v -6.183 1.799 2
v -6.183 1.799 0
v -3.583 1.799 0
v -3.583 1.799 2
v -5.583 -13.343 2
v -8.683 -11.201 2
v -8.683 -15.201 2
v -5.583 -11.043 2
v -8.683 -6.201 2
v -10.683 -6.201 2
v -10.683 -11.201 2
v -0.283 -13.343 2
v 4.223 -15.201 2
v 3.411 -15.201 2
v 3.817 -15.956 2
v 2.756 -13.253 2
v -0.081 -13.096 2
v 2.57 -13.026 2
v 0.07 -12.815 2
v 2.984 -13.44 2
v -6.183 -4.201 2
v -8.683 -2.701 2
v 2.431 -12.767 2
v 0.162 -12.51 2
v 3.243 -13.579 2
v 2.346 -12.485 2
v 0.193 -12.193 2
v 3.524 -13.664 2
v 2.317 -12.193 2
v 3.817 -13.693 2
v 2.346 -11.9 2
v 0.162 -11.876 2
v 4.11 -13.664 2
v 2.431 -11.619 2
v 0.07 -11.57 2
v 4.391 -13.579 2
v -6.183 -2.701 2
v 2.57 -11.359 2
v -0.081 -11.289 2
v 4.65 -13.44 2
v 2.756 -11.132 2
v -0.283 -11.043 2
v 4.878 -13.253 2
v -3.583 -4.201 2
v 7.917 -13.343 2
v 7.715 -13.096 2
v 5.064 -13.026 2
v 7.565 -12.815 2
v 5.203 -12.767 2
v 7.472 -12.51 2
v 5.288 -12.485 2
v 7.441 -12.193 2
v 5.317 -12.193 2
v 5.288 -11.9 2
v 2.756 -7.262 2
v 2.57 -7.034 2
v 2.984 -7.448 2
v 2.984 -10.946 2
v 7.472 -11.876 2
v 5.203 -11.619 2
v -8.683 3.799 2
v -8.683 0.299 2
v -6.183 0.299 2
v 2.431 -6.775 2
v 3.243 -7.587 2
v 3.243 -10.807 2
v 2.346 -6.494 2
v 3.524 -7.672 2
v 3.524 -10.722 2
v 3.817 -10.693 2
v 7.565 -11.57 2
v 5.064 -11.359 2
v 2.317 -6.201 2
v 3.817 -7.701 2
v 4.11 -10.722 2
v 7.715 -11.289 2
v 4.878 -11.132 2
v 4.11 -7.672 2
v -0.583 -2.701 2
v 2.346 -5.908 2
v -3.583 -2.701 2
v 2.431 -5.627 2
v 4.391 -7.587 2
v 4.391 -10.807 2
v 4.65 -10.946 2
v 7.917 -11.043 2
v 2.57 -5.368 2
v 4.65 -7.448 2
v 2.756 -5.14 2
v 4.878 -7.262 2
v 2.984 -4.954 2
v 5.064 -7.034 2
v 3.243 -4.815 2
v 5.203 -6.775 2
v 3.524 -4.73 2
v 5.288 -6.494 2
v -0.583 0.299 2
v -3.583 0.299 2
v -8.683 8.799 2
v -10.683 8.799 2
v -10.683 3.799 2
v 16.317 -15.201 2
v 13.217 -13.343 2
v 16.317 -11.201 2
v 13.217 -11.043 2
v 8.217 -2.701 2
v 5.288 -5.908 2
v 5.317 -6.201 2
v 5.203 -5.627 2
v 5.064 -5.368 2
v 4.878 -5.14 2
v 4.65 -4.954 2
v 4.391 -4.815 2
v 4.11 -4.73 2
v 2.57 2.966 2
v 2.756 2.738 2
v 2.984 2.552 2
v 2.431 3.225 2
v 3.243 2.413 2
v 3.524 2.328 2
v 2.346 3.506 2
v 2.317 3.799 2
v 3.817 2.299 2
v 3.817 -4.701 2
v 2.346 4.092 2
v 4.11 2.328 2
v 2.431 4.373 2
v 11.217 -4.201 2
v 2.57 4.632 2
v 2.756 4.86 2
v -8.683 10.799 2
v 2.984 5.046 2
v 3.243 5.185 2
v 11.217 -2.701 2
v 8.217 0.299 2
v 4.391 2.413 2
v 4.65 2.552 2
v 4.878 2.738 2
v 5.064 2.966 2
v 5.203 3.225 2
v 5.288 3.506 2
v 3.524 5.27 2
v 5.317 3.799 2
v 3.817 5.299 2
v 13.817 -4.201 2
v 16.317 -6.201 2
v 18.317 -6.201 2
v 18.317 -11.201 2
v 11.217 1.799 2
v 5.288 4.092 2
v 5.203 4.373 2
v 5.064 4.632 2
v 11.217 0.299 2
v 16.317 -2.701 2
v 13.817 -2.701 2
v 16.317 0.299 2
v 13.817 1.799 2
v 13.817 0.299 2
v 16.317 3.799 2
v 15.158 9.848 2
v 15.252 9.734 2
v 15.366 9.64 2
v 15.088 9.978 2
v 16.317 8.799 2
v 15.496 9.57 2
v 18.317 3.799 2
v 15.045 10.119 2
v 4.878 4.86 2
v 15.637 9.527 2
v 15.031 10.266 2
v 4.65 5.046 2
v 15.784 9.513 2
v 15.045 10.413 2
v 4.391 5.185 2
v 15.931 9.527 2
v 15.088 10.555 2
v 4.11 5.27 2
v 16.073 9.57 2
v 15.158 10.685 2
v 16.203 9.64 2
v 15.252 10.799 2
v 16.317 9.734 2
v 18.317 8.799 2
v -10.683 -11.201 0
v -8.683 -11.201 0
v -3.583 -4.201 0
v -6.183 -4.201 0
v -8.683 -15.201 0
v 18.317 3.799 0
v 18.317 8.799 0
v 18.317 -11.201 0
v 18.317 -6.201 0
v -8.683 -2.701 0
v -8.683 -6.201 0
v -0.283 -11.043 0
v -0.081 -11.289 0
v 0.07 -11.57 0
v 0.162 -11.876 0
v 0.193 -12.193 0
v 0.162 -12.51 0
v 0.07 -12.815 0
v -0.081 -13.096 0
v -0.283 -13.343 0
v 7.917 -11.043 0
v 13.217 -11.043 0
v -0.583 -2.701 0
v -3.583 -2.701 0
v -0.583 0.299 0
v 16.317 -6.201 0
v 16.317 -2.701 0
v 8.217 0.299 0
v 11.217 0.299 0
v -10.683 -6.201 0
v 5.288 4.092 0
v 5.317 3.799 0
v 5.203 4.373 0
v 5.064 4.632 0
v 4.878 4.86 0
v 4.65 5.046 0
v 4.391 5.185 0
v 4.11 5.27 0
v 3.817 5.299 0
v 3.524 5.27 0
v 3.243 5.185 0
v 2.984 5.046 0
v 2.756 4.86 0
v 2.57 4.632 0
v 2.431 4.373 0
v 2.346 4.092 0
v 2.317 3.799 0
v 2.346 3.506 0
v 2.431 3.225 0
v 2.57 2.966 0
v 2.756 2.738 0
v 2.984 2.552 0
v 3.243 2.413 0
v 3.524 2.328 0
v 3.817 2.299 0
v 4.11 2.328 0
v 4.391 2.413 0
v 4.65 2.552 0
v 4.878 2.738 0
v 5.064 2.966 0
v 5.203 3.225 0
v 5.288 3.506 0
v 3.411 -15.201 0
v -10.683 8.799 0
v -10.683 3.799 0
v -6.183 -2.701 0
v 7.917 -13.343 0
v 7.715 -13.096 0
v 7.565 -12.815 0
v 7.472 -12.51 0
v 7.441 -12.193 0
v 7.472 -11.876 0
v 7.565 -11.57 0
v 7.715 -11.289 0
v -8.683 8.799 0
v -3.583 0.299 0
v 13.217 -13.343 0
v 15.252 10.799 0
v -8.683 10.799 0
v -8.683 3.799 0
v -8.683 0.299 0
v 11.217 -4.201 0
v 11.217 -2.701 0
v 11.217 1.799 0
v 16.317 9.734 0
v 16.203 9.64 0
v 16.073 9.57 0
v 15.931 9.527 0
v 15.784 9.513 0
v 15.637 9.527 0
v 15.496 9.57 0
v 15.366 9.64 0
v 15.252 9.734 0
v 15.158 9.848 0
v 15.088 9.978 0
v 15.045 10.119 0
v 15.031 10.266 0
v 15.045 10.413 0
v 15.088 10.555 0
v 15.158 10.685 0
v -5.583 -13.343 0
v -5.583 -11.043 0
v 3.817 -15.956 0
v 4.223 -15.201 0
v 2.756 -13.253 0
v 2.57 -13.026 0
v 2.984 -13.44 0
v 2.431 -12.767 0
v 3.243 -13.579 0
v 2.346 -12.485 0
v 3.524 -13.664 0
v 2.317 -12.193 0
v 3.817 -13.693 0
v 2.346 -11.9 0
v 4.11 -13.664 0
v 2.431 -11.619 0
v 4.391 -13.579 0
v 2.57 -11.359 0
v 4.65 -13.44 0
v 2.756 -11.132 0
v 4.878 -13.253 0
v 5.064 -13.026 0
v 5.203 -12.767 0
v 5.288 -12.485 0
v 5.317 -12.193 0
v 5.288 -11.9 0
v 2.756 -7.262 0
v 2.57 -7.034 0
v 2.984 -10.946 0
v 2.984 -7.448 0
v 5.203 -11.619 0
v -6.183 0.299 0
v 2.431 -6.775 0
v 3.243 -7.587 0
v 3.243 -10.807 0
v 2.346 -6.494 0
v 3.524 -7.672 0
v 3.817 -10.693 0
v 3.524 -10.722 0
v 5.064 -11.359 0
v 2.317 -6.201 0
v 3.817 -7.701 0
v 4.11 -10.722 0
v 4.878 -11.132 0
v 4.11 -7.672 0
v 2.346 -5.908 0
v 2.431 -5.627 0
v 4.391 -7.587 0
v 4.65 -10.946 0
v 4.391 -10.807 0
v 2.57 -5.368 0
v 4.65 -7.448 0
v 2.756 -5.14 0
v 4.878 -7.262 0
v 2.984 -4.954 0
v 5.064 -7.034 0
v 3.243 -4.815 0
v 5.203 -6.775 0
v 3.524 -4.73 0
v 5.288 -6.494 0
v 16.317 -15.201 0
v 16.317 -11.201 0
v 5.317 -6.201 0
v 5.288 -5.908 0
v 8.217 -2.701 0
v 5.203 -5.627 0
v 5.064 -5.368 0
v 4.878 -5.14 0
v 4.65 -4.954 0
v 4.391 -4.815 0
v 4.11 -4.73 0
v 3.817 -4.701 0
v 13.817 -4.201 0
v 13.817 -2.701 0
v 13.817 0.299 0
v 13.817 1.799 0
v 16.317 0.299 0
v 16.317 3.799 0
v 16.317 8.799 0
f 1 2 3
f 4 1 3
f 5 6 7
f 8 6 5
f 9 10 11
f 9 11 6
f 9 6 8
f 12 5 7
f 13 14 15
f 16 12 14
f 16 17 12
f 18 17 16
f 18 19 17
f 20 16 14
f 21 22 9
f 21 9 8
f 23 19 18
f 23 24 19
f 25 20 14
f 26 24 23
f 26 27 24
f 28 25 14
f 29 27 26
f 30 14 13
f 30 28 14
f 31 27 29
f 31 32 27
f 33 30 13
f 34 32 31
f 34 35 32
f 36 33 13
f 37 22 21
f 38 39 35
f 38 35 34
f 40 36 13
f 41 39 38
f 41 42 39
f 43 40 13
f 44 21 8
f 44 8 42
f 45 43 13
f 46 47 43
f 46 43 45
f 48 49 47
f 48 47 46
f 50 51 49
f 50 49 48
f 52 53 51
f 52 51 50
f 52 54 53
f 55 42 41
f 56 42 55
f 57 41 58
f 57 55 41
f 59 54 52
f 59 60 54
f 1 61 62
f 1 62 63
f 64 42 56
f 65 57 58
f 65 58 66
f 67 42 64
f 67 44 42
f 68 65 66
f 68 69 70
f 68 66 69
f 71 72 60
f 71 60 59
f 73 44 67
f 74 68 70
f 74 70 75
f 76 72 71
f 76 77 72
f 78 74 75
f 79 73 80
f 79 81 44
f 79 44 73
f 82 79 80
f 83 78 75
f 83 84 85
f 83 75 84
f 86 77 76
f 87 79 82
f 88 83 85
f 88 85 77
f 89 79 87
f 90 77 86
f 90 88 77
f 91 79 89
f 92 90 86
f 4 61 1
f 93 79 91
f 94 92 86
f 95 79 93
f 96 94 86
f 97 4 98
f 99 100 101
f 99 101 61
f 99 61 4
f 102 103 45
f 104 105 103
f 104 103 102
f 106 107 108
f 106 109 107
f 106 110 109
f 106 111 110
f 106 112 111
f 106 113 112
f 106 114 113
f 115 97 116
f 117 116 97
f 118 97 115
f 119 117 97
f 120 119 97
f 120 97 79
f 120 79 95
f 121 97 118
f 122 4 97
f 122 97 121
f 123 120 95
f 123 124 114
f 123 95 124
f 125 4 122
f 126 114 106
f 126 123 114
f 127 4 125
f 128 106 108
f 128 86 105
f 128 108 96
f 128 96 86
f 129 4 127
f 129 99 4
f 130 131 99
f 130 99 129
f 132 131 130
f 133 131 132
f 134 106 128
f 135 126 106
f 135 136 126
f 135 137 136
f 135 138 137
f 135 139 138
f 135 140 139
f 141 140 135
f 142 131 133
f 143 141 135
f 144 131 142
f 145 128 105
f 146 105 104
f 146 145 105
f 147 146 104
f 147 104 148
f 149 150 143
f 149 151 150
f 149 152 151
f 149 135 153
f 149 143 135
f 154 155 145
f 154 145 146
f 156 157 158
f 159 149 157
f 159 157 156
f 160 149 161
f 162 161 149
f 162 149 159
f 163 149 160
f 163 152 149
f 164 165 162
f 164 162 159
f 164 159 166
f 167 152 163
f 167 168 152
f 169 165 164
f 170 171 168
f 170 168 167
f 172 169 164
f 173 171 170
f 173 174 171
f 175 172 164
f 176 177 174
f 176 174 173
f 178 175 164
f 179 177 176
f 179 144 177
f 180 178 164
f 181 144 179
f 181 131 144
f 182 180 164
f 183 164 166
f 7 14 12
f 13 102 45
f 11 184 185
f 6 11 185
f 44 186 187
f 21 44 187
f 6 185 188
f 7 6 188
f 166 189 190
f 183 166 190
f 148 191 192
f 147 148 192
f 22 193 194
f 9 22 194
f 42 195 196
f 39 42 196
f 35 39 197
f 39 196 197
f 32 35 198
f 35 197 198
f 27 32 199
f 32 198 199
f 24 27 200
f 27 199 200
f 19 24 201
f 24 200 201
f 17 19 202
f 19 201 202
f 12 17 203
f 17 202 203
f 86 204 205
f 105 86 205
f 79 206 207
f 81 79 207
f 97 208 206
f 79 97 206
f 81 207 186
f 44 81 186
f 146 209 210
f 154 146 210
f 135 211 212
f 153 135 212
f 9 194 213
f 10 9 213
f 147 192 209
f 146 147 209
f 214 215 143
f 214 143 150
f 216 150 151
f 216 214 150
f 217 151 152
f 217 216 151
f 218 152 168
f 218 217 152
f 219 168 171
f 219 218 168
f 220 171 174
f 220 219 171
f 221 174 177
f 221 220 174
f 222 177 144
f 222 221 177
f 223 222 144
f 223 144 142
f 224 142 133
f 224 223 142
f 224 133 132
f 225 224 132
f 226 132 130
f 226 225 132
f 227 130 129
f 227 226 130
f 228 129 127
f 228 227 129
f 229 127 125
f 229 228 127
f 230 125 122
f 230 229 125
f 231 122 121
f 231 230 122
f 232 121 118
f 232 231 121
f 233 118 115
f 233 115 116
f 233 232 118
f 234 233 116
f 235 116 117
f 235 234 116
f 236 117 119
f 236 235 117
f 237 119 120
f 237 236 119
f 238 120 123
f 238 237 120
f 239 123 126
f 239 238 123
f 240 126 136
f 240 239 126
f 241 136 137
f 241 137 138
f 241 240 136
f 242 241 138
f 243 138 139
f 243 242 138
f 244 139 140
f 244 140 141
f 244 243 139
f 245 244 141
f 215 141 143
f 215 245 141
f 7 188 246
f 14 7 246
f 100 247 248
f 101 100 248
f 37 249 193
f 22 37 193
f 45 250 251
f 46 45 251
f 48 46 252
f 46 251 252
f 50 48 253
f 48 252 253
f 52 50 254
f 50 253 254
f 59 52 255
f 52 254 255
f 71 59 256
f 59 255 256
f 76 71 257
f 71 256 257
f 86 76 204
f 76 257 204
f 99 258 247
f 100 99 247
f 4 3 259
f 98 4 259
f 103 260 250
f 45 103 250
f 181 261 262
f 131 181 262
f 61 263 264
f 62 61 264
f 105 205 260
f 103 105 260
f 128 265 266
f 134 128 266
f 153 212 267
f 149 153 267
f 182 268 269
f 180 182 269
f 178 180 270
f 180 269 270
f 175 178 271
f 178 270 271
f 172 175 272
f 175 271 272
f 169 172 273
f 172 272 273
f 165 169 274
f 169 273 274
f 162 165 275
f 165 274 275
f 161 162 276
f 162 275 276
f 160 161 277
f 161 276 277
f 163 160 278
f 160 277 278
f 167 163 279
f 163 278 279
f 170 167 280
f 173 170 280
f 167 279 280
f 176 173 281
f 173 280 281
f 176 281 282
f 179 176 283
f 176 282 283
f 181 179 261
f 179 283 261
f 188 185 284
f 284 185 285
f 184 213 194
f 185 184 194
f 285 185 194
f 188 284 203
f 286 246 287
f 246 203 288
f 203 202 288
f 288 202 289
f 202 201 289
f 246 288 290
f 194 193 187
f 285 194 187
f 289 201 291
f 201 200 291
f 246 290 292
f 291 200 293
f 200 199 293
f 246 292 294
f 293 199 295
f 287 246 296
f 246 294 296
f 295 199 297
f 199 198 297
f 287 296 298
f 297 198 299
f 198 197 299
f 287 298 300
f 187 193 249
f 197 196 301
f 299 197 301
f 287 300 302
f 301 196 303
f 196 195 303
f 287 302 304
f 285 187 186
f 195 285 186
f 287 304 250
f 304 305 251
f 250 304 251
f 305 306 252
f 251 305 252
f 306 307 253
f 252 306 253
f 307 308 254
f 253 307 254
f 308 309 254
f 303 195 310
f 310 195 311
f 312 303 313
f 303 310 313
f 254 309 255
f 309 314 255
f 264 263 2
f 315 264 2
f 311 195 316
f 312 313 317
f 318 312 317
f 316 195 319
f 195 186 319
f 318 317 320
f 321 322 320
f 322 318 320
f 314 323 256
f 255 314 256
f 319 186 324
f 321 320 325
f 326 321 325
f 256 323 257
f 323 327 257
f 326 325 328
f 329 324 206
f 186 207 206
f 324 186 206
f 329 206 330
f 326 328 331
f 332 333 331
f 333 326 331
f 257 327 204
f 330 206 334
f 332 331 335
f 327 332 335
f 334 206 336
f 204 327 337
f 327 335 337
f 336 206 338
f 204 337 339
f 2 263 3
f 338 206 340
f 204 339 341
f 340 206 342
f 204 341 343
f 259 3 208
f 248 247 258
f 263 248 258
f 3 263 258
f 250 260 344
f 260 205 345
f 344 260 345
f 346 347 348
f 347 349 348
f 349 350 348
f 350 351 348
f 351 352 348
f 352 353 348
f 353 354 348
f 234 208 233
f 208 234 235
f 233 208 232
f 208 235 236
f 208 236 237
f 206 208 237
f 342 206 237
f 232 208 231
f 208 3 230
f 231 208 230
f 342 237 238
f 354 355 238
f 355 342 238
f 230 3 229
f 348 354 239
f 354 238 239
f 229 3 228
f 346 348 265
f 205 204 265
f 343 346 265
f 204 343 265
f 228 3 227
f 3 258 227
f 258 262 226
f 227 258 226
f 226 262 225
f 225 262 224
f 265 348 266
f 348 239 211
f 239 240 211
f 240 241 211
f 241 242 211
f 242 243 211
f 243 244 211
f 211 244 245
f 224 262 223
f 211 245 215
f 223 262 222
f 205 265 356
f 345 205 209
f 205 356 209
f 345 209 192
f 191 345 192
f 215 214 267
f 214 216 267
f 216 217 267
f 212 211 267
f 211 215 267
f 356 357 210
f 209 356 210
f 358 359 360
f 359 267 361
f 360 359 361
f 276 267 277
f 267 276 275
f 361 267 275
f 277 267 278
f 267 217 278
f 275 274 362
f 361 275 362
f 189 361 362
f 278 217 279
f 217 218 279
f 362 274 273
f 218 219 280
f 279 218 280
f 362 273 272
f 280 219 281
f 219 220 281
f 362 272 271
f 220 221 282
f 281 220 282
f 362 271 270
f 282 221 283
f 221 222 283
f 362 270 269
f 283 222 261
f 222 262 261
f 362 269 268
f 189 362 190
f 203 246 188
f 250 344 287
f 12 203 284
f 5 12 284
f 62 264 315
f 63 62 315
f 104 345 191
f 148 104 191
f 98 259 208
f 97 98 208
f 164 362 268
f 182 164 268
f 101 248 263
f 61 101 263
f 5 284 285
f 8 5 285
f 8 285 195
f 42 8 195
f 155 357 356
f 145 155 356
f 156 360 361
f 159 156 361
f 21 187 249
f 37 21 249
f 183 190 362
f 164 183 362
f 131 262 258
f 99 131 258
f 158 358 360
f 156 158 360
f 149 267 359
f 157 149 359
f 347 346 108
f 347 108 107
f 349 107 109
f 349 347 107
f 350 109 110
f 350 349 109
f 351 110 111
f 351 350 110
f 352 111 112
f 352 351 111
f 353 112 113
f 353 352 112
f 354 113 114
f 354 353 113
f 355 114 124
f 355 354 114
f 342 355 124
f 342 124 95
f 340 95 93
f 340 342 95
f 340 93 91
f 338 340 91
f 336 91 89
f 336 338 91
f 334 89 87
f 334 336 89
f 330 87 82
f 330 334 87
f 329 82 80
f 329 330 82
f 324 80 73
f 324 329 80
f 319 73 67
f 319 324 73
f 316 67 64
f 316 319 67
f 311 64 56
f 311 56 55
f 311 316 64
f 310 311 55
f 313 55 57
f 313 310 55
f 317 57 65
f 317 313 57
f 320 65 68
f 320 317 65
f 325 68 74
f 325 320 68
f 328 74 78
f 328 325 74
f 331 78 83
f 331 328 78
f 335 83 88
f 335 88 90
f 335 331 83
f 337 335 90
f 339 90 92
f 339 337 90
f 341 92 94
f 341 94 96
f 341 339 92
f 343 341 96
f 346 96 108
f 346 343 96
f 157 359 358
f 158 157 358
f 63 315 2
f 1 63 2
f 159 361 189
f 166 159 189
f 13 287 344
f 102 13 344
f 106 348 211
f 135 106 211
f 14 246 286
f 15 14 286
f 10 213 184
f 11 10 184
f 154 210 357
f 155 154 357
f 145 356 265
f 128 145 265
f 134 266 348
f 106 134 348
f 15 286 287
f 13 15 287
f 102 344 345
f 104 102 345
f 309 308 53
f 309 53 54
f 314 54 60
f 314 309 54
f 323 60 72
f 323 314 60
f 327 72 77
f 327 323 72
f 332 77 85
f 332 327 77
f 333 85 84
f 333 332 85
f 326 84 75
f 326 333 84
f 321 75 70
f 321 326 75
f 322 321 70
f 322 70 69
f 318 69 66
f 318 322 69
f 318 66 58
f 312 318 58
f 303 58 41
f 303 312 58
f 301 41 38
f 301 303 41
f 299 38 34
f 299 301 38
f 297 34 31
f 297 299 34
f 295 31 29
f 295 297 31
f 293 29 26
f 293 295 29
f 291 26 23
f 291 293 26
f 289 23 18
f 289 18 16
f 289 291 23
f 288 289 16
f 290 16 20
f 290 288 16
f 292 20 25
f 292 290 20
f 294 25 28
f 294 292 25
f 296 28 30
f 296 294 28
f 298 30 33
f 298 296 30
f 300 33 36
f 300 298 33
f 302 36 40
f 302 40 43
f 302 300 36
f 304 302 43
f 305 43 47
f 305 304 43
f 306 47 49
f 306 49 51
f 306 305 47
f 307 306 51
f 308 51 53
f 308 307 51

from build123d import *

# Parameters (mm, degrees)
SKETCH_1_R      = 1.5
EXTRUDE_1_DEPTH = 2


with BuildPart() as part:
    # 草图1 → 凸台-拉伸1 (new body)
    with BuildSketch(Plane.XY):
        with BuildLine():
            Line((18.317061038, 8.799028027), (16.317061038, 8.799028027))
            Line((16.317061038, 8.799028027), (16.317061038, 9.733577366))
            ThreePointArc((16.317061038, 9.733577366), (15.251610376, 9.733577366), (15.251610376, 10.799028027))
            Line((15.251610376, 10.799028027), (-8.682938962, 10.799028027))
            Line((-8.682938962, 10.799028027), (-8.682938962, 8.799028027))
            Line((-8.682938962, 8.799028027), (-10.682938962, 8.799028027))
            Line((-10.682938962, 8.799028027), (-10.682938962, 3.799028027))
            Line((-10.682938962, 3.799028027), (-8.682938962, 3.799028027))
            Line((-8.682938962, 3.799028027), (-8.682938962, 0.299028027))
            Line((-8.682938962, 0.299028027), (-6.182938962, 0.299028027))
            Line((-6.182938962, 0.299028027), (-6.182938962, 1.799028027))
            Line((-6.182938962, 1.799028027), (-3.582938962, 1.799028027))
            Line((-3.582938962, 1.799028027), (-3.582938962, 0.299028027))
            Line((-3.582938962, 0.299028027), (-0.582938962, 0.299028027))
            Line((-0.582938962, 0.299028027), (-0.582938962, -2.700971973))
            Line((-0.582938962, -2.700971973), (-3.582938962, -2.700971973))
            Line((-3.582938962, -2.700971973), (-3.582938962, -4.200971973))
            Line((-3.582938962, -4.200971973), (-6.182938962, -4.200971973))
            Line((-6.182938962, -4.200971973), (-6.182938962, -2.700971973))
            Line((-6.182938962, -2.700971973), (-8.682938962, -2.700971973))
            Line((-8.682938962, -2.700971973), (-8.682938962, -6.200971973))
            Line((-8.682938962, -6.200971973), (-10.682938962, -6.200971973))
            Line((-10.682938962, -6.200971973), (-10.682938962, -11.200971973))
            Line((-10.682938962, -11.200971973), (-8.682938962, -11.200971973))
            Line((-8.682938962, -11.200971973), (-8.682938962, -15.200971973))
            Line((-8.682938962, -15.200971973), (3.411134121, -15.200971973))
            Line((3.411134121, -15.200971973), (3.817061038, -15.955763704))
            Line((3.817061038, -15.955763704), (4.222987954, -15.200971973))
            Line((4.222987954, -15.200971973), (16.317061038, -15.200971973))
            Line((16.317061038, -15.200971973), (16.317061038, -11.200971973))
            Line((16.317061038, -11.200971973), (18.317061038, -11.200971973))
            Line((18.317061038, -11.200971973), (18.317061038, -6.200971973))
            Line((18.317061038, -6.200971973), (16.317061038, -6.200971973))
            Line((16.317061038, -6.200971973), (16.317061038, -2.700971973))
            Line((16.317061038, -2.700971973), (13.817061038, -2.700971973))
            Line((13.817061038, -2.700971973), (13.817061038, -4.200971973))
            Line((13.817061038, -4.200971973), (11.217061038, -4.200971973))
            Line((11.217061038, -4.200971973), (11.217061038, -2.700971973))
            Line((11.217061038, -2.700971973), (8.217061038, -2.700971973))
            Line((8.217061038, -2.700971973), (8.217061038, 0.299028027))
            Line((8.217061038, 0.299028027), (11.217061038, 0.299028027))
            Line((11.217061038, 0.299028027), (11.217061038, 1.799028027))
            Line((11.217061038, 1.799028027), (13.817061038, 1.799028027))
            Line((13.817061038, 1.799028027), (13.817061038, 0.299028027))
            Line((13.817061038, 0.299028027), (16.317061038, 0.299028027))
            Line((16.317061038, 0.299028027), (16.317061038, 3.799028027))
            Line((16.317061038, 3.799028027), (18.317061038, 3.799028027))
            Line((18.317061038, 3.799028027), (18.317061038, 8.799028027))
        make_face()
        with Locations((3.817061038, -6.200971973)):
            Circle(SKETCH_1_R, mode=Mode.SUBTRACT)
        with Locations((3.817061038, 3.799028027)):
            Circle(SKETCH_1_R, mode=Mode.SUBTRACT)
        with Locations((3.817061038, -12.192801434)):
            Circle(SKETCH_1_R, mode=Mode.SUBTRACT)
        with BuildLine():
            Line((13.217061038, -13.342801434), (7.917061038, -13.342801434))
            ThreePointArc((7.917061038, -13.342801434), (7.440715441, -12.192801434), (7.917061038, -11.042801434))
            Line((7.917061038, -11.042801434), (13.217061038, -11.042801434))
            Line((13.217061038, -11.042801434), (13.217061038, -13.342801434))
        make_face(mode=Mode.SUBTRACT)
        with BuildLine():
            Line((-5.582938962, -11.042801434), (-0.282938962, -11.042801434))
            ThreePointArc((-0.282938962, -11.042801434), (0.193406634, -12.192801434), (-0.282938962, -13.342801434))
            Line((-0.282938962, -13.342801434), (-5.582938962, -13.342801434))
            Line((-5.582938962, -13.342801434), (-5.582938962, -11.042801434))
        make_face(mode=Mode.SUBTRACT)
    extrude(amount=EXTRUDE_1_DEPTH)


solid = part.part
